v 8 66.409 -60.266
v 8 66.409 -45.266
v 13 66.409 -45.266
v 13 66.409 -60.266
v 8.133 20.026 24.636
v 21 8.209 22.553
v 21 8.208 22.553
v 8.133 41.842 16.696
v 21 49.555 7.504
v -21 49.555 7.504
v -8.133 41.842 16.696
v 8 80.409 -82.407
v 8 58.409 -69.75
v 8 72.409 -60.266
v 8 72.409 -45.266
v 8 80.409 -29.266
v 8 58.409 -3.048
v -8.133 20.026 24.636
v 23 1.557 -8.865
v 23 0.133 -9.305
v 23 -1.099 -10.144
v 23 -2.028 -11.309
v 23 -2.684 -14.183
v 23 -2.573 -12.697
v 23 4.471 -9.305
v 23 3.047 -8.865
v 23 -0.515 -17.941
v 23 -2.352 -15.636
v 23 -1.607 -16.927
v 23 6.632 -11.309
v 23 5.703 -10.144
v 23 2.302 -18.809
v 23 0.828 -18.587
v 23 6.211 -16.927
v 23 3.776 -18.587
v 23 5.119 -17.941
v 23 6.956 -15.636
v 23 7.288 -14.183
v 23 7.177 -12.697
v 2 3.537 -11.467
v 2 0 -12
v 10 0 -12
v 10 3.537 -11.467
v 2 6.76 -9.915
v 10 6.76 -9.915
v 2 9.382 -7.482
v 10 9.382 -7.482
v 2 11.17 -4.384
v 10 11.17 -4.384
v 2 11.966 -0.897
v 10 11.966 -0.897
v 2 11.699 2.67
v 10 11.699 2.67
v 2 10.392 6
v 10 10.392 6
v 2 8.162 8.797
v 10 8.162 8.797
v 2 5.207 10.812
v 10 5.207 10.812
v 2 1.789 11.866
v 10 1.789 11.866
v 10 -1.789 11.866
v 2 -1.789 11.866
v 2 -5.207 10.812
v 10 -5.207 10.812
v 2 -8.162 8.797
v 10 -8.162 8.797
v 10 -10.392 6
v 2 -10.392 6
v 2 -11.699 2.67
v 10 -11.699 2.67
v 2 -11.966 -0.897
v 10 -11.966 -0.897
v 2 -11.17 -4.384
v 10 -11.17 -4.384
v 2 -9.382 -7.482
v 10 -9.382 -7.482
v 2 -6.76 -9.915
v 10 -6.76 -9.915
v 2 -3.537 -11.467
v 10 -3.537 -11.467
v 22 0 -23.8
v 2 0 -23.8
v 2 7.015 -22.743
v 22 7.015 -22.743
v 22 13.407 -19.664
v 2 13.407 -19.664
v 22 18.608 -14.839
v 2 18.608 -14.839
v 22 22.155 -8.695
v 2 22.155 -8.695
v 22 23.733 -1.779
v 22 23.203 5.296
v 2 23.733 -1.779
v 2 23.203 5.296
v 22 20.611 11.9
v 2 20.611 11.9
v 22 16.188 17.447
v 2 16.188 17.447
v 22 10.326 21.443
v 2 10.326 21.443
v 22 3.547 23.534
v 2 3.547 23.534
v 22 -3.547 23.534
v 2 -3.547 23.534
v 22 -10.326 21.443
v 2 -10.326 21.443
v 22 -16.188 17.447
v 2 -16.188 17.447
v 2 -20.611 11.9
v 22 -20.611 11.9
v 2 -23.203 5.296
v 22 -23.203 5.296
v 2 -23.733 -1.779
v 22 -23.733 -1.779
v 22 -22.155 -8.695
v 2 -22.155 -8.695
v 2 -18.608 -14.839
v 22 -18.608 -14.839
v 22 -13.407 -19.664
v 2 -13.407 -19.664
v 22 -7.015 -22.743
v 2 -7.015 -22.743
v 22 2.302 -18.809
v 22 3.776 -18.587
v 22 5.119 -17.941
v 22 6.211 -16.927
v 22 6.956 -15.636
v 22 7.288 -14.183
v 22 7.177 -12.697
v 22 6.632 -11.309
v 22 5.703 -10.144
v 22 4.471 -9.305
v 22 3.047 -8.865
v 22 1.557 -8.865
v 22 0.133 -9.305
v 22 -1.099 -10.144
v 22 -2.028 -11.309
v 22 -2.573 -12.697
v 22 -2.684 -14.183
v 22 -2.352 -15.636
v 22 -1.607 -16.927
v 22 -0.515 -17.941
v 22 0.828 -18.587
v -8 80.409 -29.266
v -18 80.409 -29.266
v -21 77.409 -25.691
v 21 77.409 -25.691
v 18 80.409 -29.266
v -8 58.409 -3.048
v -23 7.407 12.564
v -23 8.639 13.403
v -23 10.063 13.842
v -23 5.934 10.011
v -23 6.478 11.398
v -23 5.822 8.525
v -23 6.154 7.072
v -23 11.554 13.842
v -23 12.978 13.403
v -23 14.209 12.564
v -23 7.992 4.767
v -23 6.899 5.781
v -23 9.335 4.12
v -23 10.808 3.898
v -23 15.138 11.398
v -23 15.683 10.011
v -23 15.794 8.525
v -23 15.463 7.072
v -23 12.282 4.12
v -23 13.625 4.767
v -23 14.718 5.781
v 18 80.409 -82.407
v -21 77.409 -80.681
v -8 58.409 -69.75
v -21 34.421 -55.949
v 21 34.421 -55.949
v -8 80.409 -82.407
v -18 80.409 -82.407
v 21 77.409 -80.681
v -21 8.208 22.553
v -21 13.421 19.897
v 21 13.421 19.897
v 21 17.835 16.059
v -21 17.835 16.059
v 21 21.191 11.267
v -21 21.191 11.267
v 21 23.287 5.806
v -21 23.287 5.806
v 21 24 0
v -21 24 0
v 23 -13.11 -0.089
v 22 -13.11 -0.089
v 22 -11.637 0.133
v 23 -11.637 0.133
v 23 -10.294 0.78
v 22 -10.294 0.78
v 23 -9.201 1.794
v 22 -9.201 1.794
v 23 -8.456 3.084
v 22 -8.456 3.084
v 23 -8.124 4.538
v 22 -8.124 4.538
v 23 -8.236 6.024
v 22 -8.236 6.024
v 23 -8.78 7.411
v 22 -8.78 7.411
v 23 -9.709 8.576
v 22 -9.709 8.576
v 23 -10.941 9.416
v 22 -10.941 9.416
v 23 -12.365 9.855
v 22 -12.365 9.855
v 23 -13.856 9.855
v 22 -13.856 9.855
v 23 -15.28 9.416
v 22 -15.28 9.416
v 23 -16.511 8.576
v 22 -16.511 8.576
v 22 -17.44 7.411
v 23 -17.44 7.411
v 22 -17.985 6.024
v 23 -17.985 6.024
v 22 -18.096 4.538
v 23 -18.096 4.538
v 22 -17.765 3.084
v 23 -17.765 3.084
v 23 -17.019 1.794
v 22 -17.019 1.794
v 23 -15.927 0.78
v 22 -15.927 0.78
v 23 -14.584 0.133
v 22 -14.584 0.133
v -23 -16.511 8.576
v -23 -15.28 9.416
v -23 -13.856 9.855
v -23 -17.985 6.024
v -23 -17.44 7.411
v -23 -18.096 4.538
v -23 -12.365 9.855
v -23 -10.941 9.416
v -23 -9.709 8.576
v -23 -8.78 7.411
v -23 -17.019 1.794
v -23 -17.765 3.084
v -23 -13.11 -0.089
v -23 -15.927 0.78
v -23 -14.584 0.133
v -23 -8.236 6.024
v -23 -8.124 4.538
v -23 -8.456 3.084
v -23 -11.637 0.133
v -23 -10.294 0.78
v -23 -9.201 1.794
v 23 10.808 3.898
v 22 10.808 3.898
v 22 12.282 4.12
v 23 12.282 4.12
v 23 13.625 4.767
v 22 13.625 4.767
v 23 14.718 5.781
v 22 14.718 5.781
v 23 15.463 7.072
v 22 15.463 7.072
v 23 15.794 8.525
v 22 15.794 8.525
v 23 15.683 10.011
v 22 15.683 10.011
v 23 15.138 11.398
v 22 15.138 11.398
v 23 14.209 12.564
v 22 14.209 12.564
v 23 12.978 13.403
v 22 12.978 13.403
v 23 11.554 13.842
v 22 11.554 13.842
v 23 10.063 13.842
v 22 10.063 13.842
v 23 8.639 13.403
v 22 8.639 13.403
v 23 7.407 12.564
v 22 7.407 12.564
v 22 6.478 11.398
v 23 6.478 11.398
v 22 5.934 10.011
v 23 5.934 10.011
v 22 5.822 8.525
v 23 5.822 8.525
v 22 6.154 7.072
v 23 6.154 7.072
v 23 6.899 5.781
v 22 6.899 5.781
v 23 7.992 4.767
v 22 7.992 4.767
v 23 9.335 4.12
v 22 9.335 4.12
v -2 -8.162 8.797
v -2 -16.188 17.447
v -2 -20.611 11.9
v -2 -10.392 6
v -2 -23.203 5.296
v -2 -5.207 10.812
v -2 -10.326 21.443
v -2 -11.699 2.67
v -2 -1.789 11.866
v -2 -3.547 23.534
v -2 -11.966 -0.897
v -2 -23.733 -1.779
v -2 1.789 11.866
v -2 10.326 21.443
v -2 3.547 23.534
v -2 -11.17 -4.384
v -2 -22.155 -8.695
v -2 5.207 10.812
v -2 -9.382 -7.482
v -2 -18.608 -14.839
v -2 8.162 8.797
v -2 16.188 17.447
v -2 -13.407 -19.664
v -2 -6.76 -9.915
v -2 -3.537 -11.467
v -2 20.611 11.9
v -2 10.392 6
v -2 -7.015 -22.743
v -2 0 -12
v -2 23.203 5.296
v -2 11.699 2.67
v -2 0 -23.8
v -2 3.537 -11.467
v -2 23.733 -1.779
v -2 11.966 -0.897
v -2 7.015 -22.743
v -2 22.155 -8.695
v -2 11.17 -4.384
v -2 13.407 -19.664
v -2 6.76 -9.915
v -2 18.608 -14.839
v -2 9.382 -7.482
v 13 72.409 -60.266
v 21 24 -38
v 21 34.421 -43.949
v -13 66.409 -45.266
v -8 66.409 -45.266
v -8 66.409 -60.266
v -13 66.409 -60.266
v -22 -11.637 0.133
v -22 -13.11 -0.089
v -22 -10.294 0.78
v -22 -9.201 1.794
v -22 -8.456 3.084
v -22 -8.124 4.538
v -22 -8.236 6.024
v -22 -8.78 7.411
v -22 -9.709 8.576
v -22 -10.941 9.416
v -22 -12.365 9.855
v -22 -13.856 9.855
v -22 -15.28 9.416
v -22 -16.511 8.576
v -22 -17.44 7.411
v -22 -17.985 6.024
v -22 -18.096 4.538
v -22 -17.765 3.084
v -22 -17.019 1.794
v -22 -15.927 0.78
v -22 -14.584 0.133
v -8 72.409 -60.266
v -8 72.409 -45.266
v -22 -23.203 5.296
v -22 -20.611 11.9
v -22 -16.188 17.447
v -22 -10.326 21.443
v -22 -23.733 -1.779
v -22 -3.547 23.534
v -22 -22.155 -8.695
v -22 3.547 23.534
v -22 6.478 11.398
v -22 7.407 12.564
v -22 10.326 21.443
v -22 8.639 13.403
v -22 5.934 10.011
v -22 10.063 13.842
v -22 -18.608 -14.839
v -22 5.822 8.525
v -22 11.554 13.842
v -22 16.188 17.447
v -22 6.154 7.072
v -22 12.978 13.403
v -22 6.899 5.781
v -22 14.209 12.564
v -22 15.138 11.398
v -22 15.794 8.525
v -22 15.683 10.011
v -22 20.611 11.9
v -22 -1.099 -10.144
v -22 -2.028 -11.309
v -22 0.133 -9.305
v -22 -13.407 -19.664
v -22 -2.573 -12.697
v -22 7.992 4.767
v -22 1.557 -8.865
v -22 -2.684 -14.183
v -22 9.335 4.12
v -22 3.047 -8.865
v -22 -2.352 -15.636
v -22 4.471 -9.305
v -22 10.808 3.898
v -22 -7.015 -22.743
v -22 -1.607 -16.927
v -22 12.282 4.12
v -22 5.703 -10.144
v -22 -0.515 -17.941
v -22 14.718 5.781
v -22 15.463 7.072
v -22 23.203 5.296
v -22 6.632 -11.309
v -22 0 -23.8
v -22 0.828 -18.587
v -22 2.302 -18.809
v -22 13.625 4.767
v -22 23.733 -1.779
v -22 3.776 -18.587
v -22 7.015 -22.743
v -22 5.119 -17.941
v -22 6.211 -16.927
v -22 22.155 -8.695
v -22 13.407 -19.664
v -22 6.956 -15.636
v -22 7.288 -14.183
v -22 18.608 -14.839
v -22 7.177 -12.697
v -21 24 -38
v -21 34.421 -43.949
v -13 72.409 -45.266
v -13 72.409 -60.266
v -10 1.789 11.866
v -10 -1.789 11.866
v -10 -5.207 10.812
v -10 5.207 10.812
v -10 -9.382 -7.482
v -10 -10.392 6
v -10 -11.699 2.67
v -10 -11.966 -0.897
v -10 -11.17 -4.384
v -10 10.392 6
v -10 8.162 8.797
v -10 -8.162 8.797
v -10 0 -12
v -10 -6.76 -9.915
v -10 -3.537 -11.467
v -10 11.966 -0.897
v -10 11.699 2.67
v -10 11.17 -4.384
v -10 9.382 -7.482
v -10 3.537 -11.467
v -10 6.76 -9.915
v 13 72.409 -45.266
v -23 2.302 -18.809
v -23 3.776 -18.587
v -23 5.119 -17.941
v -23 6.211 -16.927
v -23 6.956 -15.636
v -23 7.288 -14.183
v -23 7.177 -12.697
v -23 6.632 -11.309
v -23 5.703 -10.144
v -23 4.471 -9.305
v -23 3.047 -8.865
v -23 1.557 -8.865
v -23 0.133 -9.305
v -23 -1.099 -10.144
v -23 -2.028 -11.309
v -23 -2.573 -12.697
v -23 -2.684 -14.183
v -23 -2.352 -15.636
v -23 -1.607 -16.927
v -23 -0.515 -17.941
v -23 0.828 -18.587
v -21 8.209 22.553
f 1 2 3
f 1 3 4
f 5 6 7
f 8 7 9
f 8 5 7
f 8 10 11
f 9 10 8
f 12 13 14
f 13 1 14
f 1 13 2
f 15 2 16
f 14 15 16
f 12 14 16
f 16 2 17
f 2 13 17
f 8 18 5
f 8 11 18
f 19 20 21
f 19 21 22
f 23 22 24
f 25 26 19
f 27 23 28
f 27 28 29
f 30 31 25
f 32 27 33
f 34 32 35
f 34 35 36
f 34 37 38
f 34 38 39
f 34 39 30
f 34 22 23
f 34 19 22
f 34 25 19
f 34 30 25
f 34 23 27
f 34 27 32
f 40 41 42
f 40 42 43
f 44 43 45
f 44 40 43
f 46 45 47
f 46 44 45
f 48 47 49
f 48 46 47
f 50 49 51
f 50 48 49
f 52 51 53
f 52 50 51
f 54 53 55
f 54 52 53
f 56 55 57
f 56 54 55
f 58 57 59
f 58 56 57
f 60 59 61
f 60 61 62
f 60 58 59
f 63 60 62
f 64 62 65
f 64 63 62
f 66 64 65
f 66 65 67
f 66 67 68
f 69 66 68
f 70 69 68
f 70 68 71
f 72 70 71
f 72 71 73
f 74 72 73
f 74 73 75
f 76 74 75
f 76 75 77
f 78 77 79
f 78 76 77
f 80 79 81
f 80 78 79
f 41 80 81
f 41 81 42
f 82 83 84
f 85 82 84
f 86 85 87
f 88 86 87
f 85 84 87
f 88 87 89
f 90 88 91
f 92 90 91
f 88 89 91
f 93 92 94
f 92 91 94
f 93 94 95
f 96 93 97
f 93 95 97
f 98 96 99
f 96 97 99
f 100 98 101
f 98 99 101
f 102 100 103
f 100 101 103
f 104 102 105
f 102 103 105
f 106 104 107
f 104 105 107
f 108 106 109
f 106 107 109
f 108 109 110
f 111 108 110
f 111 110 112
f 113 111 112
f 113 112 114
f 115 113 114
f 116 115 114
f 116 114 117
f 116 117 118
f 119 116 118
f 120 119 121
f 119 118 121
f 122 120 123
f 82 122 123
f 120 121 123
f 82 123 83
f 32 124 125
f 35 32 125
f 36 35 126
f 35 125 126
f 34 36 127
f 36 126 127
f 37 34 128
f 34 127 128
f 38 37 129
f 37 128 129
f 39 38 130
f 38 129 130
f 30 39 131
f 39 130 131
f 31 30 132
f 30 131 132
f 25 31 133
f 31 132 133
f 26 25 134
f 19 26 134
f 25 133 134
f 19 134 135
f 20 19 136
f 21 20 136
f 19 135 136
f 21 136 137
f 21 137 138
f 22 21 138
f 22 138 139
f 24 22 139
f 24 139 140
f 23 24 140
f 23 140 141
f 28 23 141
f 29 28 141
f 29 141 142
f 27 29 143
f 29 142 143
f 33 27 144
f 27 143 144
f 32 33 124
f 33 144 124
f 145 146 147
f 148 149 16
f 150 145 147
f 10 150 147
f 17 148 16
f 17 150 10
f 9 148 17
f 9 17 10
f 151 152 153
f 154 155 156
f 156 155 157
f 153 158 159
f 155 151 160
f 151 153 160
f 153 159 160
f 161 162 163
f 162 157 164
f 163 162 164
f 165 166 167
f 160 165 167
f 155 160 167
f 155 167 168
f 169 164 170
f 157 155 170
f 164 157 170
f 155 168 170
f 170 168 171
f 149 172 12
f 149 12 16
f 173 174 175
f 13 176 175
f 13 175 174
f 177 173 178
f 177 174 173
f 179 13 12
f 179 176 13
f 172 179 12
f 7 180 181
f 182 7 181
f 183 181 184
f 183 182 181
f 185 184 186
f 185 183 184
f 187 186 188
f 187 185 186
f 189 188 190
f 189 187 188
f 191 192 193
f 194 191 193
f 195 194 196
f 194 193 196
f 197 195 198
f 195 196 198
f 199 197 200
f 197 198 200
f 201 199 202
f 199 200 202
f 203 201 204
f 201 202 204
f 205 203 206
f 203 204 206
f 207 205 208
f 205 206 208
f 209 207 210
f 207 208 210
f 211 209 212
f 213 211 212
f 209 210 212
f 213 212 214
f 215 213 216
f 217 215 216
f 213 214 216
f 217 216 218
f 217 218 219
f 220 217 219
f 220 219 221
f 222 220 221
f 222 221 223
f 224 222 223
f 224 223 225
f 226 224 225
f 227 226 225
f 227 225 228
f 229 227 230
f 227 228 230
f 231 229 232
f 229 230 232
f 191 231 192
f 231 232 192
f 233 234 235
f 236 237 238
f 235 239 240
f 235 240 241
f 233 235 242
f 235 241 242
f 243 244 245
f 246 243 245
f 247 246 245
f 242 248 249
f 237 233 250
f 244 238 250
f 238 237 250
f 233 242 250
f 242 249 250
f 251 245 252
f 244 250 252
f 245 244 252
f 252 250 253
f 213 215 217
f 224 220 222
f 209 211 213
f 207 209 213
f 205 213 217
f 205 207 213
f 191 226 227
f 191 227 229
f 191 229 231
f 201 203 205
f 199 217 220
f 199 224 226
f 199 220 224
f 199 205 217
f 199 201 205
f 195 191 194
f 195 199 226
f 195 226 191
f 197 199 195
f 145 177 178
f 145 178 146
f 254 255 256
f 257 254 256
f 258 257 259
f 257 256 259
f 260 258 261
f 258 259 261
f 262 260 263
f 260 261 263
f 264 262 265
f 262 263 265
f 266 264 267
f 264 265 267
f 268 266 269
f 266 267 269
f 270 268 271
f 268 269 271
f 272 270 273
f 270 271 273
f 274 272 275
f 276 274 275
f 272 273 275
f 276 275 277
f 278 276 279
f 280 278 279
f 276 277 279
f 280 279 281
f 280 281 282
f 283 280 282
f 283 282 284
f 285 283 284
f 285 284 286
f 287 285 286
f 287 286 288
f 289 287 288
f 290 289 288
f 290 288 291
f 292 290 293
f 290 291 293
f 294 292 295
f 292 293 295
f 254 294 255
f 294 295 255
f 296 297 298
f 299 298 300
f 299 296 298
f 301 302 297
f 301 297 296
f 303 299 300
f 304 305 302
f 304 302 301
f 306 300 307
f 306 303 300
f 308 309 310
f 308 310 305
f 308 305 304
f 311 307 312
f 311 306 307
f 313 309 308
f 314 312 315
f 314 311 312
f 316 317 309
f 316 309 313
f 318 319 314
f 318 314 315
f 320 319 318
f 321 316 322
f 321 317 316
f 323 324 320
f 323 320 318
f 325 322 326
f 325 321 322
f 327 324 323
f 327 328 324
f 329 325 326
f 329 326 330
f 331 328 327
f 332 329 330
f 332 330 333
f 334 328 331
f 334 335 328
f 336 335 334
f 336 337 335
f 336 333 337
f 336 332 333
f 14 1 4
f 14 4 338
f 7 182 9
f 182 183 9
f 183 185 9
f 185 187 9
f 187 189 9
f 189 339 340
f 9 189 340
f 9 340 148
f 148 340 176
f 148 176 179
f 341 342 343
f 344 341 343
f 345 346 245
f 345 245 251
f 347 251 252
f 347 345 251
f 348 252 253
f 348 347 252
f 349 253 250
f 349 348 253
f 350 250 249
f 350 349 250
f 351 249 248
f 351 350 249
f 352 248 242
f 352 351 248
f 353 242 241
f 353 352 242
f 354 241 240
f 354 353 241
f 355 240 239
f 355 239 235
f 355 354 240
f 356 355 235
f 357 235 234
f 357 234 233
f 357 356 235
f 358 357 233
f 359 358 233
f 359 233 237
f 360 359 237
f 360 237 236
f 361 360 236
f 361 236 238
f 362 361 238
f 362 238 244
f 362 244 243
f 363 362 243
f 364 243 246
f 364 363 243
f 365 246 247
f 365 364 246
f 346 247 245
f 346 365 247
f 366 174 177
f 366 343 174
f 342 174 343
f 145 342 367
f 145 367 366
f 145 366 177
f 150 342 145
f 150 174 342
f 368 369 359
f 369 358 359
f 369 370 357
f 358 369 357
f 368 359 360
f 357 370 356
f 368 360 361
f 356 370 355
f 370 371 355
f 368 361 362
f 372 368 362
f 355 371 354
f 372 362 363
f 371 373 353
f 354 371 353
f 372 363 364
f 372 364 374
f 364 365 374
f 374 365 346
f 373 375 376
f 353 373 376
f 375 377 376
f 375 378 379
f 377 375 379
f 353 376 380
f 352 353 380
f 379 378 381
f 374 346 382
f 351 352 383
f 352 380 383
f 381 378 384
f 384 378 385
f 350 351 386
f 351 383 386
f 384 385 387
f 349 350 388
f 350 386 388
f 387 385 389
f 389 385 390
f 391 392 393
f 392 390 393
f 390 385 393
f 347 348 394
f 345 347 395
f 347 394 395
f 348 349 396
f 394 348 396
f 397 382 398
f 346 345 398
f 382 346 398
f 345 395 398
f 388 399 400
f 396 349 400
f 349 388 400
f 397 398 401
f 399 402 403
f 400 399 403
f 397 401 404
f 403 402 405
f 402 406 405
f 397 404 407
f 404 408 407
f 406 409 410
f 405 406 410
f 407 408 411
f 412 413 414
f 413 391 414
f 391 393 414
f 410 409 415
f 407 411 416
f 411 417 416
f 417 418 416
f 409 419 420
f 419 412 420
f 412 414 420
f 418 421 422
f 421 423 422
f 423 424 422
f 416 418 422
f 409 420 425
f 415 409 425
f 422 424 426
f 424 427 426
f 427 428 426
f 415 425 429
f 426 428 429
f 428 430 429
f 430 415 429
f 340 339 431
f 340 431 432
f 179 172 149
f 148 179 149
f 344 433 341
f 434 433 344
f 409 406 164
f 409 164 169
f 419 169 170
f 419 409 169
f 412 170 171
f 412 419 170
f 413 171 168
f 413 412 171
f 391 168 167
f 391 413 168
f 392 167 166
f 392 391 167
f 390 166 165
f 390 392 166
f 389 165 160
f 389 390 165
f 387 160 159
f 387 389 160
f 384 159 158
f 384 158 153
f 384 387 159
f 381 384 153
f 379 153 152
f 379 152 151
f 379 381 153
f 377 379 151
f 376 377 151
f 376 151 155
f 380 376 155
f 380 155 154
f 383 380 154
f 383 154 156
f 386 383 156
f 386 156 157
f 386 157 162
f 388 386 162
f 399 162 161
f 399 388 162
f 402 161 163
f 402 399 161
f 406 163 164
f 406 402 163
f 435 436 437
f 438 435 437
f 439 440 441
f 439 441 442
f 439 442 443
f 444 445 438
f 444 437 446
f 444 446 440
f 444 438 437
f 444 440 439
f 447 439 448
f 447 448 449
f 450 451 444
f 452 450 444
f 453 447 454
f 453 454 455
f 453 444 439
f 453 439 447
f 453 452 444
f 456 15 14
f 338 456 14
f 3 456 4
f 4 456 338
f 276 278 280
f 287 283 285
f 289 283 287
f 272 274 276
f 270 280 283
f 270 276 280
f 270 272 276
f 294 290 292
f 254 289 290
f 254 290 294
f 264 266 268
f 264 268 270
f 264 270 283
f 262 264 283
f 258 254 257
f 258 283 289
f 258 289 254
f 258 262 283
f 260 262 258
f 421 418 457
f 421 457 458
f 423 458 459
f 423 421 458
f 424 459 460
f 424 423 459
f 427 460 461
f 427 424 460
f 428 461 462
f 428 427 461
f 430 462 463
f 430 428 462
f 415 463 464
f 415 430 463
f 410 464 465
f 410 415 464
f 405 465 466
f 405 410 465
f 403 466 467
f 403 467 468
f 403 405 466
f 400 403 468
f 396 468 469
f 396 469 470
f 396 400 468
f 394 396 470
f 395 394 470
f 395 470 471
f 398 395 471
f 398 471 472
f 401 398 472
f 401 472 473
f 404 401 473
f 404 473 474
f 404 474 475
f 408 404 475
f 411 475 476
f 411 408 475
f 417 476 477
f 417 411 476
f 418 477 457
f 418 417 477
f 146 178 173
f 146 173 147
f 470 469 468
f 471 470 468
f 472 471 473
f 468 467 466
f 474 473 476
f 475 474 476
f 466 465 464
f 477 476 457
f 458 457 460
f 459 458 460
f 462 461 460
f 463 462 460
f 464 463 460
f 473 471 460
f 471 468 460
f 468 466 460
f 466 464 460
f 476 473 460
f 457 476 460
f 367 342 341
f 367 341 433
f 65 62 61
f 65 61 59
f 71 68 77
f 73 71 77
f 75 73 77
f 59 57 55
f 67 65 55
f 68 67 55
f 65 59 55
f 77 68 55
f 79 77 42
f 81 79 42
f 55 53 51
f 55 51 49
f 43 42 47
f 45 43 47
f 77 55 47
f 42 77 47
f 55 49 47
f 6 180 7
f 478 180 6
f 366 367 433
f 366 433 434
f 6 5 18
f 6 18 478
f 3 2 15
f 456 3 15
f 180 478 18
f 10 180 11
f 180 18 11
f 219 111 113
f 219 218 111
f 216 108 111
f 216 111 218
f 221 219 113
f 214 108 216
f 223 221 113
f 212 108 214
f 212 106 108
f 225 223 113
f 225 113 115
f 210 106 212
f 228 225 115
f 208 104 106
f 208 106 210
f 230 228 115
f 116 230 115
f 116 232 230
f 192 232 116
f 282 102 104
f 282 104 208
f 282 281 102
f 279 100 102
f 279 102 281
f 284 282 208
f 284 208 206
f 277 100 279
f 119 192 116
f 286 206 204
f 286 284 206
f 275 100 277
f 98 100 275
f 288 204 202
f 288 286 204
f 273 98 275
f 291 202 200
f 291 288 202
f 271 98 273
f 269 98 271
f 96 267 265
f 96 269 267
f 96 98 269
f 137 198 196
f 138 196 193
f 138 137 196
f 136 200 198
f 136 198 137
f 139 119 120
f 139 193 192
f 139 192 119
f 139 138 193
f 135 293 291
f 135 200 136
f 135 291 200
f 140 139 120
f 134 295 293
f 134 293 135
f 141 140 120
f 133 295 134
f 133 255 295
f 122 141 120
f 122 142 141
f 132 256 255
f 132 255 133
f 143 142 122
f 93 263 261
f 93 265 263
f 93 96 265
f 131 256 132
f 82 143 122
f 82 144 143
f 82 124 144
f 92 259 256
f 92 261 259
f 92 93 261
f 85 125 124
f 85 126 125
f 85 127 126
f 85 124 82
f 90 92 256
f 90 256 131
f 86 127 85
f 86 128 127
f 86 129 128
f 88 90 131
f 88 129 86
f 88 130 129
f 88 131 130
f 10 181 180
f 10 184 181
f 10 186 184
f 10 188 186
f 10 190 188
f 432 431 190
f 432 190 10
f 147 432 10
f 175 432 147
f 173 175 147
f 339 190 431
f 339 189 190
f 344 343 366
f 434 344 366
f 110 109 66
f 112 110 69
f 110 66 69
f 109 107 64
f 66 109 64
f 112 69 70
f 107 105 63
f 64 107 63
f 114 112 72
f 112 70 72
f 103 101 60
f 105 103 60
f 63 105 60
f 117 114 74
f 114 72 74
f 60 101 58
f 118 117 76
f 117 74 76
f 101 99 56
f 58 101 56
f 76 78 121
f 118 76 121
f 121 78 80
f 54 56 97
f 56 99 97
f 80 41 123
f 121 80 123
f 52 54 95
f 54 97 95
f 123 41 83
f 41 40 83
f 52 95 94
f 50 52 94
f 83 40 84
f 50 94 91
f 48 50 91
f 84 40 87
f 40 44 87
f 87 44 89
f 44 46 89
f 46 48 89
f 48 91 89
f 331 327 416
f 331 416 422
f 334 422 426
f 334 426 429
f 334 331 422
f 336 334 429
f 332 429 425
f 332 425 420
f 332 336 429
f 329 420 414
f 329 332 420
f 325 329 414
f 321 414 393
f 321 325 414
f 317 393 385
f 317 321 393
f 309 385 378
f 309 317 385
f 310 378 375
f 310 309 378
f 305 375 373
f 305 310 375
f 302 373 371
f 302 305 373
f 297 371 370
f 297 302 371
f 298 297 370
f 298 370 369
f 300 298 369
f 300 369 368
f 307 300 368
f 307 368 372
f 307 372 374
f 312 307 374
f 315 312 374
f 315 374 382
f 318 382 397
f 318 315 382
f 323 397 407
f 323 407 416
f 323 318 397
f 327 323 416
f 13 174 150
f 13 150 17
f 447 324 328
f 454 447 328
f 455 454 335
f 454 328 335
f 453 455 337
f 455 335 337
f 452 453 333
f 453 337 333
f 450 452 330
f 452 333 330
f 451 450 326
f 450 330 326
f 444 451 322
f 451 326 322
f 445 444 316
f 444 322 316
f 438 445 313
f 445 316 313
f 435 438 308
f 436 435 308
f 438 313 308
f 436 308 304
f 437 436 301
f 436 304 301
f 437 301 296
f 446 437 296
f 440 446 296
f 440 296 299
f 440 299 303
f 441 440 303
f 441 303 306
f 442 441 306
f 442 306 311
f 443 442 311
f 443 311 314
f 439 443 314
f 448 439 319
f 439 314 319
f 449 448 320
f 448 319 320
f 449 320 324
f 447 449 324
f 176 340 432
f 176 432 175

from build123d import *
from OCP.BRepFilletAPI import BRepFilletAPI_MakeChamfer

# Parameters (mm, degrees)
BOSS_EXTRUDE1_START = 1
SKETCH1_R           = 11.9
BOSS_EXTRUDE1_DEPTH = 10
BOSS_EXTRUDE2_START = -1
SKETCH1_2_R         = 11.9
BOSS_EXTRUDE2_DEPTH = 10
SKETCH2_R           = 6
CUT_EXTRUDE1_DEPTH  = 4
BOSS_EXTRUDE3_DEPTH = 10.5
SKETCH4_W           = 21
SKETCH4_H           = 22
BOSS_EXTRUDE4_DEPTH = 3
CHAMFER1_SIZE       = 5.196152423
CHAMFER1_SIZE_2     = 3
CHAMFER2_SIZE       = 3
CHAMFER2_SIZE2      = 6.433520762
SKETCH5_R           = 2.5
BOSS_EXTRUDE5_DEPTH = 0.5
SKETCH7_W           = 8
SKETCH7_H           = 11
CUT_EXTRUDE2_DEPTH  = 59.705665531
CHAMFER3_SIZE       = 1.5
SCALE2_SCALE        = 2
SKETCH9_W           = 15
SKETCH9_H           = 6
CUT_EXTRUDE3_DEPTH  = 5


with BuildPart() as part:
    # Sketch1 → Boss-Extrude1 (new body)
    with BuildSketch(Plane(origin=(0, 0, 0), x_dir=(0, 0, -1), z_dir=(1, 0, 0)).offset(BOSS_EXTRUDE1_START)):
        Circle(SKETCH1_R)
    extrude(amount=BOSS_EXTRUDE1_DEPTH)


with BuildPart() as body_2:
    # Sketch1<2> → Boss-Extrude2 (new body)
    with BuildSketch(Plane(origin=(0, 0, 0), x_dir=(0, 0, -1), z_dir=(1, 0, 0)).offset(BOSS_EXTRUDE2_START)):
        Circle(SKETCH1_2_R)
    extrude(amount=-BOSS_EXTRUDE2_DEPTH)

    # Sketch2 → Cut-Extrude1 (cut)
    with BuildSketch(Plane(origin=(-1, 0, 0), x_dir=(0, 0, -1), z_dir=(1, 0, 0))):
        Circle(SKETCH2_R)
    cut_extrude1 = extrude(amount=-CUT_EXTRUDE1_DEPTH, mode=Mode.SUBTRACT)


with BuildPart() as part_1:
    add(part.part)

    # Mirror1: Cut-Extrude1 across plane
    add(cut_extrude1.mirror(Plane(origin=(0, 0, 0), x_dir=(0, 0, 1), z_dir=(1, 0, 0))), mode=Mode.SUBTRACT)

    # Sketch5 → Boss-Extrude5 (add)
    with BuildSketch(Plane(origin=(11, 0, 0), x_dir=(0, 0, -1), z_dir=(1, 0, 0))):
        with Locations((-4.449139328, 5.404179793)):
            Circle(SKETCH5_R)
        with Locations((6.904726652, 1.150977786)):
            Circle(SKETCH5_R)
        with Locations((-2.455587324, -6.55515758)):
            Circle(SKETCH5_R)
    boss_extrude5 = extrude(amount=BOSS_EXTRUDE5_DEPTH)


with BuildPart() as body_3:
    # Sketch3 → Boss-Extrude3 (new, symmetric)
    with BuildSketch(Plane(origin=(0, 0, 0), x_dir=(0, 0, -1), z_dir=(1, 0, 0))):
        with BuildLine():
            Line((0, 12), (19, 12))
            Line((19, 12), (21.974680573, 17.210688581))
            Line((21.974680573, 17.210688581), (27.974680573, 17.210688581))
            Line((27.974680573, 17.210688581), (41.203310943, 40.20438201))
            Line((41.203310943, 40.20438201), (14.633198339, 40.20438201))
            Line((14.633198339, 40.20438201), (-3.751868296, 24.777479377))
            Line((-3.751868296, 24.777479377), (-11.276311449, 4.10424172))
            ThreePointArc((-11.276311449, 4.10424172), (-6.882917236, 9.829824531), (0, 12))
        make_face()
    extrude(amount=BOSS_EXTRUDE3_DEPTH, both=True)

    # Sketch4 → Boss-Extrude4 (add)
    with BuildSketch(Plane(origin=(0, 4.10424172, 11.276311449), x_dir=(1, 0, 0), z_dir=(0, 0.34202014332566527, 0.9396926207859096))):
        with Locations((0, 11)):
            Rectangle(SKETCH4_W, SKETCH4_H)
    extrude(amount=BOSS_EXTRUDE4_DEPTH)

    # Chamfer1
    chamfer1_edges_1 = [body_3.edges().sort_by_distance(p)[0] for p in [
        (0, 25.803539807, 6.570946159),
    ]]
    chamfer1_side_1 = [body_3.faces().sort_by_distance(p)[0] for p in [
        (0, 25.74715825, 6.591467367),
    ]]
    chamfer1_edges_2 = [body_3.edges().sort_by_distance(p)[0] for p in [
        (0, 5.13030215, 14.095389312),
    ]]
    chamfer1_side_2 = [body_3.faces().sort_by_distance(p)[0] for p in [
        (0, 5.109780941, 14.039007755),
    ]]
    chamfer1 = BRepFilletAPI_MakeChamfer(body_3.part.solid().wrapped)
    for e in chamfer1_edges_1:
        chamfer1.Add(CHAMFER1_SIZE - 0.0001, CHAMFER1_SIZE_2 - 0.0001, e.wrapped, chamfer1_side_1[0].wrapped)
    for e in chamfer1_edges_2:
        chamfer1.Add(CHAMFER1_SIZE_2 - 0.0001, CHAMFER1_SIZE - 0.0001, e.wrapped, chamfer1_side_2[0].wrapped)
    add(Compound.cast(chamfer1.Shape()), mode=Mode.REPLACE)  # a hair under: the kernel refuses the full size

    # Chamfer2: one chamfer whose edges measure the first distance from different faces: ONE call of the kernel's chamfer builder (chamfer() names one face for all edges)
    chamfer2_edges_1 = [body_3.edges().sort_by_distance(p)[0] for p in [
        (10.5, 15.466920979, 10.333167735),
    ]]
    chamfer2_side_1 = [body_3.faces().sort_by_distance(p)[0] for p in [
        (10.5, 25.167414296, -14.377800232),
    ]]
    chamfer2_edges_2 = [body_3.edges().sort_by_distance(p)[0] for p in [
        (-10.5, 15.466920979, 10.333167735),
    ]]
    chamfer2_side_2 = [body_3.faces().sort_by_distance(p)[0] for p in [
        (-10.5, 25.167414296, -14.377800232),
    ]]
    chamfer2 = BRepFilletAPI_MakeChamfer(body_3.part.solid().wrapped)
    for e in chamfer2_edges_1:
        chamfer2.Add(CHAMFER2_SIZE, CHAMFER2_SIZE2, e.wrapped, chamfer2_side_1[0].wrapped)  # the first distance lies on this face
    for e in chamfer2_edges_2:
        chamfer2.Add(CHAMFER2_SIZE, CHAMFER2_SIZE2, e.wrapped, chamfer2_side_2[0].wrapped)  # the first distance lies on this face
    add(Compound.cast(chamfer2.Shape()), mode=Mode.REPLACE)

    # Sketch7 → Cut-Extrude2 (cut, through all)
    with BuildSketch(Plane.XY):
        with Locations((0, 34.70438201)):
            Rectangle(SKETCH7_W, SKETCH7_H)
    extrude(amount=-CUT_EXTRUDE2_DEPTH, mode=Mode.SUBTRACT)

    # Chamfer3
    chamfer3_edges = [body_3.edges().sort_by_distance(p)[0] for p in [
        (10.5, 40.20438201, -27.918254641),
        (-10.5, 40.20438201, -27.918254641),
    ]]
    chamfer(chamfer3_edges, length=CHAMFER3_SIZE)


with BuildPart() as body_2_1:
    add(body_2.part)

    # Mirror2: Boss-Extrude5 across plane
    add(boss_extrude5.mirror(Plane(origin=(0, 0, 0), x_dir=(0, 0, 1), z_dir=(1, 0, 0))))


with BuildPart() as body_2_2:
    # Scale2: scaled about (0, 0, 0)
    add(body_2_1.part.scale(SCALE2_SCALE))


with BuildPart() as body_3_1:
    # Scale2: scaled about (0, 0, 0)
    add(body_3.part.scale(SCALE2_SCALE))

    # Sketch9 → Cut-Extrude3 (cut)
    with BuildSketch(Plane(origin=(-8, 0, 0), x_dir=(0, 0, -1), z_dir=(1, 0, 0))):
        with Locations((52.766396677, 69.408764019)):
            Rectangle(SKETCH9_W, SKETCH9_H)
    cut_extrude3 = extrude(amount=-CUT_EXTRUDE3_DEPTH, mode=Mode.SUBTRACT)

    # Mirror3: Cut-Extrude3 across plane
    add(cut_extrude3.mirror(Plane(origin=(0, 0, 0), x_dir=(0, 0, 1), z_dir=(1, 0, 0))), mode=Mode.SUBTRACT)


with BuildPart() as part_2:
    # Scale2: scaled about (0, 0, 0)
    add(part_1.part.scale(SCALE2_SCALE))


solid = Compound([body_2_2.part, body_3_1.part, part_2.part])
